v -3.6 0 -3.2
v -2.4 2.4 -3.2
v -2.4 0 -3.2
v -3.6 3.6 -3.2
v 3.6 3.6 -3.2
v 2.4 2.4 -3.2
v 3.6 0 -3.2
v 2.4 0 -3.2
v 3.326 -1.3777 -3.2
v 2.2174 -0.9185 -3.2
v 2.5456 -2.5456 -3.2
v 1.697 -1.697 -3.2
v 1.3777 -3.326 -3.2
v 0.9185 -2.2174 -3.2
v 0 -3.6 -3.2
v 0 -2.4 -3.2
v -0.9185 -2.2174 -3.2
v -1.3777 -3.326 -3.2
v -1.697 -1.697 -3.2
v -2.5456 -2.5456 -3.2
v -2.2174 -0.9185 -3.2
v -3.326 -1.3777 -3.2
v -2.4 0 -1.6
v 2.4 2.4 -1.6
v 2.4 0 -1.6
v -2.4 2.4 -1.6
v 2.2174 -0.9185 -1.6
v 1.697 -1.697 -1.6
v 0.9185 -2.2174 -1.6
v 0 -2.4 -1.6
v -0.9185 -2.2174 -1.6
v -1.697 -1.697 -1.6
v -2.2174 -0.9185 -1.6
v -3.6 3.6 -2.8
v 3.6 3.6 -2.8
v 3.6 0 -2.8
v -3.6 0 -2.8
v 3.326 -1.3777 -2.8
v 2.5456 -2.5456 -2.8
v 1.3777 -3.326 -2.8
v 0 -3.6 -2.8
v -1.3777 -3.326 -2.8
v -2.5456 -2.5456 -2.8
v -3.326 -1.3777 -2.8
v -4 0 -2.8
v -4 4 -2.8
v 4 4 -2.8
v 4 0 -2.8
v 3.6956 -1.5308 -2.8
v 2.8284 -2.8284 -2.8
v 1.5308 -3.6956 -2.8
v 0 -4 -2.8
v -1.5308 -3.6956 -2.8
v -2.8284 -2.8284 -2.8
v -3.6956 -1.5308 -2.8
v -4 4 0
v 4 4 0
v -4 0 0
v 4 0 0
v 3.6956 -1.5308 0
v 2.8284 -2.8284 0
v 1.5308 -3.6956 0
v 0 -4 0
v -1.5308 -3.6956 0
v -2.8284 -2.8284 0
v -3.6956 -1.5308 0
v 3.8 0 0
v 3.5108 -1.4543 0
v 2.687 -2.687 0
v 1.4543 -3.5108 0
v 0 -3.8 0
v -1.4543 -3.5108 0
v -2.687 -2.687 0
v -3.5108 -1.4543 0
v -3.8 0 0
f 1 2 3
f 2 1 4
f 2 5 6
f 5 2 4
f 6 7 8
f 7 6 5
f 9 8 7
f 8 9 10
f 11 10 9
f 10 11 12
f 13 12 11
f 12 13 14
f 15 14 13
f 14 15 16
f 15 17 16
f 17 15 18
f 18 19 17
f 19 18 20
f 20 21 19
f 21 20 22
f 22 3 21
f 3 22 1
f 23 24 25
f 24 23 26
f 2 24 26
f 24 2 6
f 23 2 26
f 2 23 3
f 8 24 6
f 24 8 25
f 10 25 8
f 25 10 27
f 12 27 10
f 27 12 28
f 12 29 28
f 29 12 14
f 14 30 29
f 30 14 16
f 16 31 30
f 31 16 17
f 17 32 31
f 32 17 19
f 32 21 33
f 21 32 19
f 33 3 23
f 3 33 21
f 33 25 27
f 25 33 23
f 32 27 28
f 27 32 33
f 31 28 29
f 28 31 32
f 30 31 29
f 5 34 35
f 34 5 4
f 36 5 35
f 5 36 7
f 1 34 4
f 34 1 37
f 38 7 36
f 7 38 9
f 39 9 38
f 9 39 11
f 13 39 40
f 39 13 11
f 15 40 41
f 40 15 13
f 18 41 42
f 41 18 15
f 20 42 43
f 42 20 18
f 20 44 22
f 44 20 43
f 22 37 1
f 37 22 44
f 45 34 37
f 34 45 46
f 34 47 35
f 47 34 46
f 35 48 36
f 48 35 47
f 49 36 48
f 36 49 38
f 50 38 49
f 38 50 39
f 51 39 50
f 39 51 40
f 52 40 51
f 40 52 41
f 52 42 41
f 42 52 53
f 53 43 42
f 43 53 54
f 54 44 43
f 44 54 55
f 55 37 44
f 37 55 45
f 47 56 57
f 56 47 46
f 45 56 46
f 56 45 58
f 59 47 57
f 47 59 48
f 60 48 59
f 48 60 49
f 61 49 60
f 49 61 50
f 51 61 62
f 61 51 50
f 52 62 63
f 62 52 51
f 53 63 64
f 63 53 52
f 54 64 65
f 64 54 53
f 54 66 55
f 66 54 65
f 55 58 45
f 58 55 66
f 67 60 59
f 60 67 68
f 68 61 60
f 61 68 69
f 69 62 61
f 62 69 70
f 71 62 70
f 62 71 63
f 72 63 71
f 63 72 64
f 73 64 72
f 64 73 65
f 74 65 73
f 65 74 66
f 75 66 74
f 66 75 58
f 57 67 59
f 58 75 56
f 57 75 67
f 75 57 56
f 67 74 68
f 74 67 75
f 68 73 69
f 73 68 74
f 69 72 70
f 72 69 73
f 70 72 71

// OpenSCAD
// file: ../p/2-4edge.scad
use <../lib.scad>
function ldraw_lib__2_4edge() = [
// 0 Circle 0.5
// 0 Name: 2-4edge.dat
// 0 Author: James Jessiman
// 0 !LDRAW_ORG Primitive UPDATE 2017-01
// 0 !LICENSE Licensed under CC BY 2.0 and CC BY 4.0 : see CAreadme.txt
// 
// 0 BFC CERTIFY CCW
  [0,"BFC","CERTIFY"],
  [0,"BFC","CCW"],
// 
// 0 !HISTORY 2007-06-24 [PTadmin] Header formatted for Contributor Agreement
// 0 !HISTORY 2008-07-01 [PTadmin] Official Update 2008-01
// 0 !HISTORY 2017-01-15 [Steffen] BFCed
// 0 !HISTORY 2017-12-30 [PTadmin] Official Update 2017-01
// 
// 
// 2 24 1 0 0 0.9239 0 0.3827
  [2,24,1,0,0,0.9239,0,0.3827],
// 2 24 0.9239 0 0.3827 0.7071 0 0.7071
  [2,24,0.9239,0,0.3827,0.7071,0,0.7071],
// 2 24 0.7071 0 0.7071 0.3827 0 0.9239
  [2,24,0.7071,0,0.7071,0.3827,0,0.9239],
// 2 24 0.3827 0 0.9239 0 0 1
  [2,24,0.3827,0,0.9239,0,0,1],
// 2 24 0 0 1 -0.3827 0 0.9239
  [2,24,0,0,1,-0.3827,0,0.9239],
// 2 24 -0.3827 0 0.9239 -0.7071 0 0.7071
  [2,24,-0.3827,0,0.9239,-0.7071,0,0.7071],
// 2 24 -0.7071 0 0.7071 -0.9239 0 0.3827
  [2,24,-0.7071,0,0.7071,-0.9239,0,0.3827],
// 2 24 -0.9239 0 0.3827 -1 0 0
  [2,24,-0.9239,0,0.3827,-1,0,0],
];
makepoly(ldraw_lib__2_4edge(), line=0.2);
// file: ../p/2-4cyli.scad
use <../lib.scad>
function ldraw_lib__2_4cyli() = [
// 0 Cylinder 0.5
// 0 Name: 2-4cyli.dat
// 0 Author: James Jessiman
// 0 !LDRAW_ORG Primitive UPDATE 2005-01
// 0 !LICENSE Licensed under CC BY 2.0 and CC BY 4.0 : see CAreadme.txt
// 
// 0 BFC CERTIFY CCW
  [0,"BFC","CERTIFY"],
  [0,"BFC","CCW"],
// 
// 0 !HISTORY 2002-03-23 [sbliss] Added BFC statement; compacted code
// 0 !HISTORY 2002-04-25 [PTadmin] Official Update 2002-02
// 0 !HISTORY 2004-12-11 [nielsk] Recreated using Primitive Generator, Edge lines fixed, BFC changed to CCW
// 0 !HISTORY 2005-12-28 [PTadmin] Official Update 2005-01
// 0 !HISTORY 2007-06-24 [PTadmin] Header formatted for Contributor Agreement
// 0 !HISTORY 2008-07-01 [PTadmin] Official Update 2008-01
// 
// 
// 4 16 .9239 1 .3827 .9239 0 .3827 1 0 0 1 1 0
  [4,16,.9239,1,.3827,.9239,0,.3827,1,0,0,1,1,0],
// 4 16 .7071 1 .7071 .7071 0 .7071 .9239 0 .3827 .9239 1 .3827
  [4,16,.7071,1,.7071,.7071,0,.7071,.9239,0,.3827,.9239,1,.3827],
// 4 16 .3827 1 .9239 .3827 0 .9239 .7071 0 .7071 .7071 1 .7071
  [4,16,.3827,1,.9239,.3827,0,.9239,.7071,0,.7071,.7071,1,.7071],
// 4 16 0 1 1 0 0 1 .3827 0 .9239 .3827 1 .9239
  [4,16,0,1,1,0,0,1,.3827,0,.9239,.3827,1,.9239],
// 4 16 -.3827 1 .9239 -.3827 0 .9239 0 0 1 0 1 1
  [4,16,-.3827,1,.9239,-.3827,0,.9239,0,0,1,0,1,1],
// 4 16 -.7071 1 .7071 -.7071 0 .7071 -.3827 0 .9239 -.3827 1 .9239
  [4,16,-.7071,1,.7071,-.7071,0,.7071,-.3827,0,.9239,-.3827,1,.9239],
// 4 16 -.9239 1 .3827 -.9239 0 .3827 -.7071 0 .7071 -.7071 1 .7071
  [4,16,-.9239,1,.3827,-.9239,0,.3827,-.7071,0,.7071,-.7071,1,.7071],
// 4 16 -1 1 0 -1 0 0 -.9239 0 .3827 -.9239 1 .3827
  [4,16,-1,1,0,-1,0,0,-.9239,0,.3827,-.9239,1,.3827],
// 5 24 1 1 0 1 0 0 1 1 -.4142 .9239 1 .3827
  [5,24,1,1,0,1,0,0,1,1,-.4142,.9239,1,.3827],
// 5 24 .9239 1 .3827 .9239 0 .3827 1 1 0 .7071 1 .7071
  [5,24,.9239,1,.3827,.9239,0,.3827,1,1,0,.7071,1,.7071],
// 5 24 .7071 1 .7071 .7071 0 .7071 .9239 1 .3827 .3827 1 .9239
  [5,24,.7071,1,.7071,.7071,0,.7071,.9239,1,.3827,.3827,1,.9239],
// 5 24 .3827 1 .9239 .3827 0 .9239 .7071 1 .7071 0 1 1
  [5,24,.3827,1,.9239,.3827,0,.9239,.7071,1,.7071,0,1,1],
// 5 24 0 1 1 0 0 1 .3827 1 .9239 -.3827 1 .9239
  [5,24,0,1,1,0,0,1,.3827,1,.9239,-.3827,1,.9239],
// 5 24 -.3827 1 .9239 -.3827 0 .9239 0 1 1 -.7071 1 .7071
  [5,24,-.3827,1,.9239,-.3827,0,.9239,0,1,1,-.7071,1,.7071],
// 5 24 -.7071 1 .7071 -.7071 0 .7071 -.3827 1 .9239 -.9239 1 .3827
  [5,24,-.7071,1,.7071,-.7071,0,.7071,-.3827,1,.9239,-.9239,1,.3827],
// 5 24 -.9239 1 .3827 -.9239 0 .3827 -.7071 1 .7071 -1 1 0
  [5,24,-.9239,1,.3827,-.9239,0,.3827,-.7071,1,.7071,-1,1,0],
// 5 24 -1 1 0 -1 0 0 -.9239 1 .3827 -1 1 -.4142
  [5,24,-1,1,0,-1,0,0,-.9239,1,.3827,-1,1,-.4142],
// 0
];
makepoly(ldraw_lib__2_4cyli(), line=0.2);
// file: ../p/box4-4a.scad
use <../lib.scad>
function ldraw_lib__box4_4a() = [
// 0 Box with 4 Faces without 4 Adjacent Edges
// 0 Name: box4-4a.dat
// 0 Author: Manfred Moolhuysen
// 0 !LDRAW_ORG Primitive UPDATE 2012-01
// 0 !LICENSE Licensed under CC BY 2.0 and CC BY 4.0 : see CAreadme.txt
// 
// 0 BFC CERTIFY CCW
  [0,"BFC","CERTIFY"],
  [0,"BFC","CCW"],
// 
// 0 !HISTORY 1998-07-15 [PTadmin] Official Update 1998-07
// 0 !HISTORY 2002-12-13 [hafhead] Made BFC compliant
// 0 !HISTORY 2003-03-12 [PTadmin] Official Update 2003-01
// 0 !HISTORY 2007-06-24 [PTadmin] Header formatted for Contributor Agreement
// 0 !HISTORY 2008-07-01 [PTadmin] Official Update 2008-01
// 0 !HISTORY 2012-02-16 [Philo] Changed to CCW
// 0 !HISTORY 2012-03-30 [PTadmin] Official Update 2012-01
// 
// 
// 2 24 1 1 1 -1 1 1
  [2,24,1,1,1,-1,1,1],
// 2 24 -1 1 1 -1 1 -1
  [2,24,-1,1,1,-1,1,-1],
// 2 24 1 1 -1 1 1 1
  [2,24,1,1,-1,1,1,1],
// 2 24 1 0 1 -1 0 1
  [2,24,1,0,1,-1,0,1],
// 2 24 -1 0 1 -1 0 -1
  [2,24,-1,0,1,-1,0,-1],
// 2 24 1 0 -1 1 0 1
  [2,24,1,0,-1,1,0,1],
// 2 24 1 0 1 1 1 1
  [2,24,1,0,1,1,1,1],
// 2 24 -1 0 1 -1 1 1
  [2,24,-1,0,1,-1,1,1],
// 4 16 1 1 -1 -1 1 -1 -1 1 1 1 1 1
  [4,16,1,1,-1,-1,1,-1,-1,1,1,1,1,1],
// 4 16 -1 1 1 -1 0 1 1 0 1 1 1 1
  [4,16,-1,1,1,-1,0,1,1,0,1,1,1,1],
// 4 16 -1 1 -1 -1 0 -1 -1 0 1 -1 1 1
  [4,16,-1,1,-1,-1,0,-1,-1,0,1,-1,1,1],
// 4 16 1 1 1 1 0 1 1 0 -1 1 1 -1
  [4,16,1,1,1,1,0,1,1,0,-1,1,1,-1],
];
makepoly(ldraw_lib__box4_4a(), line=0.2);
// file: ../p/box3u4a.scad
use <../lib.scad>
function ldraw_lib__box3u4a() = [
// 0 Box with 3 Faces without 4 Adjacent Edges
// 0 Name: box3u4a.dat
// 0 Author: Niels Karsdorp [nielsk]
// 0 !LDRAW_ORG Primitive UPDATE 2009-01
// 0 !LICENSE Licensed under CC BY 2.0 and CC BY 4.0 : see CAreadme.txt
// 
// 0 BFC CERTIFY CCW
  [0,"BFC","CERTIFY"],
  [0,"BFC","CCW"],
// 
// 0 !HISTORY 2009-05-02 [PTadmin] Official Update 2009-01
// 
// 
// 2 24 1 1 1 -1 1 1
  [2,24,1,1,1,-1,1,1],
// 2 24 -1 1 -1 1 1 -1
  [2,24,-1,1,-1,1,1,-1],
// 2 24 1 1 1 1 1 -1
  [2,24,1,1,1,1,1,-1],
// 2 24 -1 1 1 -1 1 -1
  [2,24,-1,1,1,-1,1,-1],
// 2 24 1 1 1 1 0 1
  [2,24,1,1,1,1,0,1],
// 2 24 1 1 -1 1 0 -1
  [2,24,1,1,-1,1,0,-1],
// 2 24 -1 1 1 -1 0 1
  [2,24,-1,1,1,-1,0,1],
// 2 24 -1 1 -1 -1 0 -1
  [2,24,-1,1,-1,-1,0,-1],
// 4 16 -1 1 -1 -1 1 1 1 1 1 1 1 -1
  [4,16,-1,1,-1,-1,1,1,1,1,1,1,1,-1],
// 4 16 -1 1 1 -1 0 1 1 0 1 1 1 1
  [4,16,-1,1,1,-1,0,1,1,0,1,1,1,1],
// 4 16 1 1 -1 1 0 -1 -1 0 -1 -1 1 -1
  [4,16,1,1,-1,1,0,-1,-1,0,-1,-1,1,-1],
// 0
];
makepoly(ldraw_lib__box3u4a(), line=0.2);
// file: ../p/2-4ring9.scad
use <../lib.scad>
function ldraw_lib__2_4ring9() = [
// 0 Ring  9 x 0.5
// 0 Name: 2-4ring9.dat
// 0 Author: Guy Vivan [guyvivan]
// 0 !LDRAW_ORG Primitive UPDATE 2009-02
// 0 !LICENSE Licensed under CC BY 2.0 and CC BY 4.0 : see CAreadme.txt
// 
// 0 BFC CERTIFY CCW
  [0,"BFC","CERTIFY"],
  [0,"BFC","CCW"],
// 
// 0 !HISTORY 2009-09-03 [PTadmin] Official Update 2009-02
// 
// 
// 4 16 9 0 0 10 0 0 9.239 0 3.827 8.3151 0 3.4443
  [4,16,9,0,0,10,0,0,9.239,0,3.827,8.3151,0,3.4443],
// 4 16 8.3151 0 3.4443 9.239 0 3.827 7.071 0 7.071 6.3639 0 6.3639
  [4,16,8.3151,0,3.4443,9.239,0,3.827,7.071,0,7.071,6.3639,0,6.3639],
// 4 16 6.3639 0 6.3639 7.071 0 7.071 3.827 0 9.239 3.4443 0 8.3151
  [4,16,6.3639,0,6.3639,7.071,0,7.071,3.827,0,9.239,3.4443,0,8.3151],
// 4 16 3.4443 0 8.3151 3.827 0 9.239 0 0 10 0 0 9
  [4,16,3.4443,0,8.3151,3.827,0,9.239,0,0,10,0,0,9],
// 4 16 0 0 9 0 0 10 -3.827 0 9.239 -3.4443 0 8.3151
  [4,16,0,0,9,0,0,10,-3.827,0,9.239,-3.4443,0,8.3151],
// 4 16 -3.4443 0 8.3151 -3.827 0 9.239 -7.071 0 7.071 -6.3639 0 6.3639
  [4,16,-3.4443,0,8.3151,-3.827,0,9.239,-7.071,0,7.071,-6.3639,0,6.3639],
// 4 16 -6.3639 0 6.3639 -7.071 0 7.071 -9.239 0 3.827 -8.3151 0 3.4443
  [4,16,-6.3639,0,6.3639,-7.071,0,7.071,-9.239,0,3.827,-8.3151,0,3.4443],
// 4 16 -8.3151 0 3.4443 -9.239 0 3.827 -10 0 0 -9 0 0
  [4,16,-8.3151,0,3.4443,-9.239,0,3.827,-10,0,0,-9,0,0],
// 
// 0 end of file
// 
];
makepoly(ldraw_lib__2_4ring9(), line=0.2);
// file: ../p/2-4ring2.scad
use <../lib.scad>
function ldraw_lib__2_4ring2() = [
// 0 Ring  2 x 0.5
// 0 Name: 2-4ring2.dat
// 0 Author: Chris Dee [cwdee]
// 0 !LDRAW_ORG Primitive UPDATE 2012-01
// 0 !LICENSE Licensed under CC BY 2.0 and CC BY 4.0 : see CAreadme.txt
// 
// 0 BFC CERTIFY CCW
  [0,"BFC","CERTIFY"],
  [0,"BFC","CCW"],
// 
// 0 !HISTORY 2001-10-26 [PTadmin] Official Update 2001-01
// 0 !HISTORY 2007-06-24 [PTadmin] Header formatted for Contributor Agreement
// 0 !HISTORY 2008-07-01 [PTadmin] Official Update 2008-01
// 0 !HISTORY 2012-02-16 [Philo] Changed to CCW
// 0 !HISTORY 2012-03-30 [PTadmin] Official Update 2012-01
// 
// 
// 4 16 3 0 0 2.7717 0 1.1481 1.8478 0 0.7654 2 0 0
  [4,16,3,0,0,2.7717,0,1.1481,1.8478,0,0.7654,2,0,0],
// 4 16 2.7717 0 1.1481 2.1213 0 2.1213 1.4142 0 1.4142 1.8478 0 0.7654
  [4,16,2.7717,0,1.1481,2.1213,0,2.1213,1.4142,0,1.4142,1.8478,0,0.7654],
// 4 16 2.1213 0 2.1213 1.1481 0 2.7717 0.7654 0 1.8478 1.4142 0 1.4142
  [4,16,2.1213,0,2.1213,1.1481,0,2.7717,0.7654,0,1.8478,1.4142,0,1.4142],
// 4 16 1.1481 0 2.7717 0 0 3 0 0 2 0.7654 0 1.8478
  [4,16,1.1481,0,2.7717,0,0,3,0,0,2,0.7654,0,1.8478],
// 4 16 0 0 3 -1.1481 0 2.7717 -0.7654 0 1.8478 0 0 2
  [4,16,0,0,3,-1.1481,0,2.7717,-0.7654,0,1.8478,0,0,2],
// 4 16 -1.1481 0 2.7717 -2.1213 0 2.1213 -1.4142 0 1.4142 -0.7654 0 1.8478
  [4,16,-1.1481,0,2.7717,-2.1213,0,2.1213,-1.4142,0,1.4142,-0.7654,0,1.8478],
// 4 16 -2.1213 0 2.1213 -2.7717 0 1.1481 -1.8478 0 0.7654 -1.4142 0 1.4142
  [4,16,-2.1213,0,2.1213,-2.7717,0,1.1481,-1.8478,0,0.7654,-1.4142,0,1.4142],
// 4 16 -2.7717 0 1.1481 -3 0 0 -2 0 0 -1.8478 0 0.7654
  [4,16,-2.7717,0,1.1481,-3,0,0,-2,0,0,-1.8478,0,0.7654],
];
makepoly(ldraw_lib__2_4ring2(), line=0.2);
// file: ../p/2-4cylo.scad
use <../lib.scad>
use <2-4cyli.scad>
use <2-4edge.scad>
function ldraw_lib__2_4cylo() = [
// 0 Cylinder Open 0.5
// 0 Name: 2-4cylo.dat
// 0 Author: Max Martin Richter [MMR1988]
// 0 !LDRAW_ORG Primitive UPDATE 2010-03
// 0 !LICENSE Licensed under CC BY 2.0 and CC BY 4.0 : see CAreadme.txt
// 
// 0 BFC CERTIFY CCW
  [0,"BFC","CERTIFY"],
  [0,"BFC","CCW"],
// 
// 0 !HISTORY 2010-12-31 [PTadmin] Official Update 2010-03
// 
// 
// 1 16 0 0 0 1 0 0 0 1 0 0 0 1 2-4edge.dat
  [1,16,0,0,0,1,0,0,0,1,0,0,0,1, ldraw_lib__2_4edge()],
// 1 16 0 1 0 1 0 0 0 1 0 0 0 1 2-4edge.dat
  [1,16,0,1,0,1,0,0,0,1,0,0,0,1, ldraw_lib__2_4edge()],
// 1 16 0 0 0 1 0 0 0 1 0 0 0 1 2-4cyli.dat
  [1,16,0,0,0,1,0,0,0,1,0,0,0,1, ldraw_lib__2_4cyli()],
];
makepoly(ldraw_lib__2_4cylo(), line=0.2);
// file: s/24246s02.scad
use <../../lib.scad>
use <../../p/2-4chrd.scad>
use <../../p/2-4cylo.scad>
use <../../p/2-4ring2.scad>
use <../../p/2-4ring9.scad>
use <../../p/box3u4a.scad>
use <../../p/box4-4a.scad>
function ldraw_lib__s__24246s02() = [
// 0 ~Tile  1 x  1 with Rounded End without Complete Top Face
// 0 Name: s\24246s02.dat
// 0 Author: Magnus Forsberg [MagFors]
// 0 !LDRAW_ORG Subpart UPDATE 2020-02
// 0 !LICENSE Licensed under CC BY 2.0 and CC BY 4.0 : see CAreadme.txt
// 
// 0 BFC CERTIFY CCW
  [0,"BFC","CERTIFY"],
  [0,"BFC","CCW"],
// 
// 0 !HISTORY 2020-09-05 [PTadmin] Official Update 2020-02
// 
// 
// 4 16 -9 8 0 -9 8 9 -6 8 6 -6 8 0
  [4,16,-9,8,0,-9,8,9,-6,8,6,-6,8,0],
// 4 16 -9 8 9 9 8 9 6 8 6 -6 8 6
  [4,16,-9,8,9,9,8,9,6,8,6,-6,8,6],
// 4 16 9 8 9 9 8 0 6 8 0 6 8 6
  [4,16,9,8,9,9,8,0,6,8,0,6,8,6],
// 1 16 0 8 0 3 0 0 0 -1 0 0 0 -3 2-4ring2.dat
  [1,16,0,8,0,3,0,0,0,-1,0,0,0,-3, ldraw_lib__2_4ring2()],
// 0 BFC INVERTNEXT
  [0,"BFC","INVERTNEXT"],
// 1 16 0 8 3 6 0 0 0 -4 0 0 0 3 box4-4a.dat
  [1,16,0,8,3,6,0,0,0,-4,0,0,0,3, ldraw_lib__box4_4a()],
// 0 BFC INVERTNEXT
  [0,"BFC","INVERTNEXT"],
// 1 16 0 4 0 6 0 0 0 4 0 0 0 -6 2-4cylo.dat
  [1,16,0,4,0,6,0,0,0,4,0,0,0,-6, ldraw_lib__2_4cylo()],
// 1 16 0 4 0 6 0 0 0 -4 0 0 0 -6 2-4chrd.dat
  [1,16,0,4,0,6,0,0,0,-4,0,0,0,-6, ldraw_lib__2_4chrd()],
// 1 16 0 7.5 0 0 0 9 0.5 0 0 0 9 0 box3u4a.dat
  [1,16,0,7.5,0,0,0,9,0.5,0,0,0,9,0, ldraw_lib__box3u4a()],
// 1 16 0 7 0 9 0 0 0 1 0 0 0 -9 2-4cylo.dat
  [1,16,0,7,0,9,0,0,0,1,0,0,0,-9, ldraw_lib__2_4cylo()],
// 4 16 -10 7 0 -10 7 10 -9 7 9 -9 7 0
  [4,16,-10,7,0,-10,7,10,-9,7,9,-9,7,0],
// 4 16 -10 7 10 10 7 10 9 7 9 -9 7 9
  [4,16,-10,7,10,10,7,10,9,7,9,-9,7,9],
// 4 16 10 7 10 10 7 0 9 7 0 9 7 9
  [4,16,10,7,10,10,7,0,9,7,0,9,7,9],
// 1 16 0 7 0 1 0 0 0 -1 0 0 0 -1 2-4ring9.dat
  [1,16,0,7,0,1,0,0,0,-1,0,0,0,-1, ldraw_lib__2_4ring9()],
// 1 16 0 3.5 0 0 0 -10 -3.5 0 0 0 10 0 box3u4a.dat
  [1,16,0,3.5,0,0,0,-10,-3.5,0,0,0,10,0, ldraw_lib__box3u4a()],
// 1 16 0 0 0 10 0 0 0 7 0 0 0 -10 2-4cylo.dat
  [1,16,0,0,0,10,0,0,0,7,0,0,0,-10, ldraw_lib__2_4cylo()],
];
makepoly(ldraw_lib__s__24246s02(), line=0.2);
// file: ../p/2-4ring19.scad
use <../lib.scad>
function ldraw_lib__2_4ring19() = [
// 0 Ring 19 x 0.5
// 0 Name: 2-4ring19.dat
// 0 Author: Kevin Roach [KROACH]
// 0 !LDRAW_ORG Primitive UPDATE 2016-01
// 0 !LICENSE Licensed under CC BY 2.0 and CC BY 4.0 : see CAreadme.txt
// 
// 0 BFC CERTIFY CCW
  [0,"BFC","CERTIFY"],
  [0,"BFC","CCW"],
// 
// 0 !HISTORY 2016-12-31 [PTadmin] Official Update 2016-01
// 
// 
// 4 16 20 0 0 18.478 0 7.654 17.5541 0 7.2713 19 0 0
  [4,16,20,0,0,18.478,0,7.654,17.5541,0,7.2713,19,0,0],
// 4 16 18.478 0 7.654 14.142 0 14.142 13.4349 0 13.4349 17.5541 0 7.2713
  [4,16,18.478,0,7.654,14.142,0,14.142,13.4349,0,13.4349,17.5541,0,7.2713],
// 4 16 14.142 0 14.142 7.654 0 18.478 7.2713 0 17.5541 13.4349 0 13.4349
  [4,16,14.142,0,14.142,7.654,0,18.478,7.2713,0,17.5541,13.4349,0,13.4349],
// 4 16 7.654 0 18.478 0 0 20 0 0 19 7.2713 0 17.5541
  [4,16,7.654,0,18.478,0,0,20,0,0,19,7.2713,0,17.5541],
// 4 16 0 0 20 -7.654 0 18.478 -7.2713 0 17.5541 0 0 19
  [4,16,0,0,20,-7.654,0,18.478,-7.2713,0,17.5541,0,0,19],
// 4 16 -7.654 0 18.478 -14.142 0 14.142 -13.4349 0 13.4349 -7.2713 0 17.5541
  [4,16,-7.654,0,18.478,-14.142,0,14.142,-13.4349,0,13.4349,-7.2713,0,17.5541],
// 4 16 -14.142 0 14.142 -18.478 0 7.654 -17.5541 0 7.2713 -13.4349 0 13.4349
  [4,16,-14.142,0,14.142,-18.478,0,7.654,-17.5541,0,7.2713,-13.4349,0,13.4349],
// 4 16 -18.478 0 7.654 -20 0 0 -19 0 0 -17.5541 0 7.2713
  [4,16,-18.478,0,7.654,-20,0,0,-19,0,0,-17.5541,0,7.2713],
// 
];
makepoly(ldraw_lib__2_4ring19(), line=0.2);
// file: s/24246s01.scad
use <../../lib.scad>
use <../../p/2-4ring19.scad>
use <24246s02.scad>
function ldraw_lib__s__24246s01() = [
// 0 ~Tile  1 x  1 with Rounded End with Partial Top Face
// 0 Name: s\24246s01.dat
// 0 Author: Owen Burgoyne [C3POwen]
// 0 !LDRAW_ORG Subpart UPDATE 2020-02
// 0 !LICENSE Licensed under CC BY 2.0 and CC BY 4.0 : see CAreadme.txt
// 
// 0 BFC CERTIFY CCW
  [0,"BFC","CERTIFY"],
  [0,"BFC","CCW"],
// 
// 0 !HISTORY 2016-10-15 [MagFors] smaller topradius
// 0 !HISTORY 2016-12-31 [PTadmin] Official Update 2016-01
// 0 !HISTORY 2019-06-17 [MagFors] Removed topradius
// 0 !HISTORY 2019-07-19 [MagFors] Subfiled without top surface
// 0 !HISTORY 2020-09-05 [PTadmin] Official Update 2020-02
// 
// 
// 1 16 0 0 0 1 0 0 0 1 0 0 0 1 s\24246s02.dat
  [1,16,0,0,0,1,0,0,0,1,0,0,0,1, ldraw_lib__s__24246s02()],
// 1 16 0 0 0 .5 0 0 0 1 0 0 0 -.5 2-4ring19.dat
  [1,16,0,0,0,.5,0,0,0,1,0,0,0,-.5, ldraw_lib__2_4ring19()],
// 3 16 10 0 10 9.5 0 0 10 0 0
  [3,16,10,0,10,9.5,0,0,10,0,0],
// 3 16 -10 0 0 -9.5 0 0 -10 0 10
  [3,16,-10,0,0,-9.5,0,0,-10,0,10],
];
makepoly(ldraw_lib__s__24246s01(), line=0.2);
// file: ../p/2-4chrd.scad
use <../lib.scad>
function ldraw_lib__2_4chrd() = [
// 0 Chord 0.5
// 0 Name: 2-4chrd.dat
// 0 Author: Philippe Hurbain [Philo]
// 0 !LDRAW_ORG Primitive UPDATE 2014-01
// 0 !LICENSE Licensed under CC BY 2.0 and CC BY 4.0 : see CAreadme.txt
// 
// 0 BFC CERTIFY CCW
  [0,"BFC","CERTIFY"],
  [0,"BFC","CCW"],
// 
// 0 !HISTORY 2014-06-21 [PTadmin] Official Update 2014-01
// 
// 
// 4 16 0.9239 0 0.3827 -0.9239 0 0.3827 -1 0 0 1 0 0
  [4,16,0.9239,0,0.3827,-0.9239,0,0.3827,-1,0,0,1,0,0],
// 4 16 0.7071 0 0.7071 -0.7071 0 0.7071 -0.9239 0 0.3827 0.9239 0 0.3827
  [4,16,0.7071,0,0.7071,-0.7071,0,0.7071,-0.9239,0,0.3827,0.9239,0,0.3827],
// 4 16 0.3827 0 0.9239 -0.3827 0 0.9239 -0.7071 0 0.7071 0.7071 0 0.7071
  [4,16,0.3827,0,0.9239,-0.3827,0,0.9239,-0.7071,0,0.7071,0.7071,0,0.7071],
// 3 16 0 0 1 -0.3827 0 0.9239 0.3827 0 0.9239
  [3,16,0,0,1,-0.3827,0,0.9239,0.3827,0,0.9239],
];
makepoly(ldraw_lib__2_4chrd(), line=0.2);
// main file
use <../lib.scad>
use <../p/2-4chrd.scad>
use <s/24246s01.scad>
function ldraw_lib__24246() = [
// 0 Tile  1 x  1 with Rounded End
// 0 Name: 24246.dat
// 0 Author: Owen Burgoyne [C3POwen]
// 0 !LDRAW_ORG Part UPDATE 2016-01
// 0 !LICENSE Licensed under CC BY 2.0 and CC BY 4.0 : see CAreadme.txt
// 
// 0 BFC CERTIFY CCW
  [0,"BFC","CERTIFY"],
  [0,"BFC","CCW"],
// 
// 0 !HISTORY 2016-12-31 [PTadmin] Official Update 2016-01
// 
// 
// 1 16 0 0 0 1 0 0 0 1 0 0 0 1 s\24246s01.dat
  [1,16,0,0,0,1,0,0,0,1,0,0,0,1, ldraw_lib__s__24246s01()],
// 4 16 -10 0 10 -9.5 0 0 9.5 0 0 10 0 10
  [4,16,-10,0,10,-9.5,0,0,9.5,0,0,10,0,10],
// 1 16 0 0 0 9.5 0 0 0 1 0 0 0 -9.5 2-4chrd.dat
  [1,16,0,0,0,9.5,0,0,0,1,0,0,0,-9.5, ldraw_lib__2_4chrd()],
];
makepoly(ldraw_lib__24246(), line=0.2);
